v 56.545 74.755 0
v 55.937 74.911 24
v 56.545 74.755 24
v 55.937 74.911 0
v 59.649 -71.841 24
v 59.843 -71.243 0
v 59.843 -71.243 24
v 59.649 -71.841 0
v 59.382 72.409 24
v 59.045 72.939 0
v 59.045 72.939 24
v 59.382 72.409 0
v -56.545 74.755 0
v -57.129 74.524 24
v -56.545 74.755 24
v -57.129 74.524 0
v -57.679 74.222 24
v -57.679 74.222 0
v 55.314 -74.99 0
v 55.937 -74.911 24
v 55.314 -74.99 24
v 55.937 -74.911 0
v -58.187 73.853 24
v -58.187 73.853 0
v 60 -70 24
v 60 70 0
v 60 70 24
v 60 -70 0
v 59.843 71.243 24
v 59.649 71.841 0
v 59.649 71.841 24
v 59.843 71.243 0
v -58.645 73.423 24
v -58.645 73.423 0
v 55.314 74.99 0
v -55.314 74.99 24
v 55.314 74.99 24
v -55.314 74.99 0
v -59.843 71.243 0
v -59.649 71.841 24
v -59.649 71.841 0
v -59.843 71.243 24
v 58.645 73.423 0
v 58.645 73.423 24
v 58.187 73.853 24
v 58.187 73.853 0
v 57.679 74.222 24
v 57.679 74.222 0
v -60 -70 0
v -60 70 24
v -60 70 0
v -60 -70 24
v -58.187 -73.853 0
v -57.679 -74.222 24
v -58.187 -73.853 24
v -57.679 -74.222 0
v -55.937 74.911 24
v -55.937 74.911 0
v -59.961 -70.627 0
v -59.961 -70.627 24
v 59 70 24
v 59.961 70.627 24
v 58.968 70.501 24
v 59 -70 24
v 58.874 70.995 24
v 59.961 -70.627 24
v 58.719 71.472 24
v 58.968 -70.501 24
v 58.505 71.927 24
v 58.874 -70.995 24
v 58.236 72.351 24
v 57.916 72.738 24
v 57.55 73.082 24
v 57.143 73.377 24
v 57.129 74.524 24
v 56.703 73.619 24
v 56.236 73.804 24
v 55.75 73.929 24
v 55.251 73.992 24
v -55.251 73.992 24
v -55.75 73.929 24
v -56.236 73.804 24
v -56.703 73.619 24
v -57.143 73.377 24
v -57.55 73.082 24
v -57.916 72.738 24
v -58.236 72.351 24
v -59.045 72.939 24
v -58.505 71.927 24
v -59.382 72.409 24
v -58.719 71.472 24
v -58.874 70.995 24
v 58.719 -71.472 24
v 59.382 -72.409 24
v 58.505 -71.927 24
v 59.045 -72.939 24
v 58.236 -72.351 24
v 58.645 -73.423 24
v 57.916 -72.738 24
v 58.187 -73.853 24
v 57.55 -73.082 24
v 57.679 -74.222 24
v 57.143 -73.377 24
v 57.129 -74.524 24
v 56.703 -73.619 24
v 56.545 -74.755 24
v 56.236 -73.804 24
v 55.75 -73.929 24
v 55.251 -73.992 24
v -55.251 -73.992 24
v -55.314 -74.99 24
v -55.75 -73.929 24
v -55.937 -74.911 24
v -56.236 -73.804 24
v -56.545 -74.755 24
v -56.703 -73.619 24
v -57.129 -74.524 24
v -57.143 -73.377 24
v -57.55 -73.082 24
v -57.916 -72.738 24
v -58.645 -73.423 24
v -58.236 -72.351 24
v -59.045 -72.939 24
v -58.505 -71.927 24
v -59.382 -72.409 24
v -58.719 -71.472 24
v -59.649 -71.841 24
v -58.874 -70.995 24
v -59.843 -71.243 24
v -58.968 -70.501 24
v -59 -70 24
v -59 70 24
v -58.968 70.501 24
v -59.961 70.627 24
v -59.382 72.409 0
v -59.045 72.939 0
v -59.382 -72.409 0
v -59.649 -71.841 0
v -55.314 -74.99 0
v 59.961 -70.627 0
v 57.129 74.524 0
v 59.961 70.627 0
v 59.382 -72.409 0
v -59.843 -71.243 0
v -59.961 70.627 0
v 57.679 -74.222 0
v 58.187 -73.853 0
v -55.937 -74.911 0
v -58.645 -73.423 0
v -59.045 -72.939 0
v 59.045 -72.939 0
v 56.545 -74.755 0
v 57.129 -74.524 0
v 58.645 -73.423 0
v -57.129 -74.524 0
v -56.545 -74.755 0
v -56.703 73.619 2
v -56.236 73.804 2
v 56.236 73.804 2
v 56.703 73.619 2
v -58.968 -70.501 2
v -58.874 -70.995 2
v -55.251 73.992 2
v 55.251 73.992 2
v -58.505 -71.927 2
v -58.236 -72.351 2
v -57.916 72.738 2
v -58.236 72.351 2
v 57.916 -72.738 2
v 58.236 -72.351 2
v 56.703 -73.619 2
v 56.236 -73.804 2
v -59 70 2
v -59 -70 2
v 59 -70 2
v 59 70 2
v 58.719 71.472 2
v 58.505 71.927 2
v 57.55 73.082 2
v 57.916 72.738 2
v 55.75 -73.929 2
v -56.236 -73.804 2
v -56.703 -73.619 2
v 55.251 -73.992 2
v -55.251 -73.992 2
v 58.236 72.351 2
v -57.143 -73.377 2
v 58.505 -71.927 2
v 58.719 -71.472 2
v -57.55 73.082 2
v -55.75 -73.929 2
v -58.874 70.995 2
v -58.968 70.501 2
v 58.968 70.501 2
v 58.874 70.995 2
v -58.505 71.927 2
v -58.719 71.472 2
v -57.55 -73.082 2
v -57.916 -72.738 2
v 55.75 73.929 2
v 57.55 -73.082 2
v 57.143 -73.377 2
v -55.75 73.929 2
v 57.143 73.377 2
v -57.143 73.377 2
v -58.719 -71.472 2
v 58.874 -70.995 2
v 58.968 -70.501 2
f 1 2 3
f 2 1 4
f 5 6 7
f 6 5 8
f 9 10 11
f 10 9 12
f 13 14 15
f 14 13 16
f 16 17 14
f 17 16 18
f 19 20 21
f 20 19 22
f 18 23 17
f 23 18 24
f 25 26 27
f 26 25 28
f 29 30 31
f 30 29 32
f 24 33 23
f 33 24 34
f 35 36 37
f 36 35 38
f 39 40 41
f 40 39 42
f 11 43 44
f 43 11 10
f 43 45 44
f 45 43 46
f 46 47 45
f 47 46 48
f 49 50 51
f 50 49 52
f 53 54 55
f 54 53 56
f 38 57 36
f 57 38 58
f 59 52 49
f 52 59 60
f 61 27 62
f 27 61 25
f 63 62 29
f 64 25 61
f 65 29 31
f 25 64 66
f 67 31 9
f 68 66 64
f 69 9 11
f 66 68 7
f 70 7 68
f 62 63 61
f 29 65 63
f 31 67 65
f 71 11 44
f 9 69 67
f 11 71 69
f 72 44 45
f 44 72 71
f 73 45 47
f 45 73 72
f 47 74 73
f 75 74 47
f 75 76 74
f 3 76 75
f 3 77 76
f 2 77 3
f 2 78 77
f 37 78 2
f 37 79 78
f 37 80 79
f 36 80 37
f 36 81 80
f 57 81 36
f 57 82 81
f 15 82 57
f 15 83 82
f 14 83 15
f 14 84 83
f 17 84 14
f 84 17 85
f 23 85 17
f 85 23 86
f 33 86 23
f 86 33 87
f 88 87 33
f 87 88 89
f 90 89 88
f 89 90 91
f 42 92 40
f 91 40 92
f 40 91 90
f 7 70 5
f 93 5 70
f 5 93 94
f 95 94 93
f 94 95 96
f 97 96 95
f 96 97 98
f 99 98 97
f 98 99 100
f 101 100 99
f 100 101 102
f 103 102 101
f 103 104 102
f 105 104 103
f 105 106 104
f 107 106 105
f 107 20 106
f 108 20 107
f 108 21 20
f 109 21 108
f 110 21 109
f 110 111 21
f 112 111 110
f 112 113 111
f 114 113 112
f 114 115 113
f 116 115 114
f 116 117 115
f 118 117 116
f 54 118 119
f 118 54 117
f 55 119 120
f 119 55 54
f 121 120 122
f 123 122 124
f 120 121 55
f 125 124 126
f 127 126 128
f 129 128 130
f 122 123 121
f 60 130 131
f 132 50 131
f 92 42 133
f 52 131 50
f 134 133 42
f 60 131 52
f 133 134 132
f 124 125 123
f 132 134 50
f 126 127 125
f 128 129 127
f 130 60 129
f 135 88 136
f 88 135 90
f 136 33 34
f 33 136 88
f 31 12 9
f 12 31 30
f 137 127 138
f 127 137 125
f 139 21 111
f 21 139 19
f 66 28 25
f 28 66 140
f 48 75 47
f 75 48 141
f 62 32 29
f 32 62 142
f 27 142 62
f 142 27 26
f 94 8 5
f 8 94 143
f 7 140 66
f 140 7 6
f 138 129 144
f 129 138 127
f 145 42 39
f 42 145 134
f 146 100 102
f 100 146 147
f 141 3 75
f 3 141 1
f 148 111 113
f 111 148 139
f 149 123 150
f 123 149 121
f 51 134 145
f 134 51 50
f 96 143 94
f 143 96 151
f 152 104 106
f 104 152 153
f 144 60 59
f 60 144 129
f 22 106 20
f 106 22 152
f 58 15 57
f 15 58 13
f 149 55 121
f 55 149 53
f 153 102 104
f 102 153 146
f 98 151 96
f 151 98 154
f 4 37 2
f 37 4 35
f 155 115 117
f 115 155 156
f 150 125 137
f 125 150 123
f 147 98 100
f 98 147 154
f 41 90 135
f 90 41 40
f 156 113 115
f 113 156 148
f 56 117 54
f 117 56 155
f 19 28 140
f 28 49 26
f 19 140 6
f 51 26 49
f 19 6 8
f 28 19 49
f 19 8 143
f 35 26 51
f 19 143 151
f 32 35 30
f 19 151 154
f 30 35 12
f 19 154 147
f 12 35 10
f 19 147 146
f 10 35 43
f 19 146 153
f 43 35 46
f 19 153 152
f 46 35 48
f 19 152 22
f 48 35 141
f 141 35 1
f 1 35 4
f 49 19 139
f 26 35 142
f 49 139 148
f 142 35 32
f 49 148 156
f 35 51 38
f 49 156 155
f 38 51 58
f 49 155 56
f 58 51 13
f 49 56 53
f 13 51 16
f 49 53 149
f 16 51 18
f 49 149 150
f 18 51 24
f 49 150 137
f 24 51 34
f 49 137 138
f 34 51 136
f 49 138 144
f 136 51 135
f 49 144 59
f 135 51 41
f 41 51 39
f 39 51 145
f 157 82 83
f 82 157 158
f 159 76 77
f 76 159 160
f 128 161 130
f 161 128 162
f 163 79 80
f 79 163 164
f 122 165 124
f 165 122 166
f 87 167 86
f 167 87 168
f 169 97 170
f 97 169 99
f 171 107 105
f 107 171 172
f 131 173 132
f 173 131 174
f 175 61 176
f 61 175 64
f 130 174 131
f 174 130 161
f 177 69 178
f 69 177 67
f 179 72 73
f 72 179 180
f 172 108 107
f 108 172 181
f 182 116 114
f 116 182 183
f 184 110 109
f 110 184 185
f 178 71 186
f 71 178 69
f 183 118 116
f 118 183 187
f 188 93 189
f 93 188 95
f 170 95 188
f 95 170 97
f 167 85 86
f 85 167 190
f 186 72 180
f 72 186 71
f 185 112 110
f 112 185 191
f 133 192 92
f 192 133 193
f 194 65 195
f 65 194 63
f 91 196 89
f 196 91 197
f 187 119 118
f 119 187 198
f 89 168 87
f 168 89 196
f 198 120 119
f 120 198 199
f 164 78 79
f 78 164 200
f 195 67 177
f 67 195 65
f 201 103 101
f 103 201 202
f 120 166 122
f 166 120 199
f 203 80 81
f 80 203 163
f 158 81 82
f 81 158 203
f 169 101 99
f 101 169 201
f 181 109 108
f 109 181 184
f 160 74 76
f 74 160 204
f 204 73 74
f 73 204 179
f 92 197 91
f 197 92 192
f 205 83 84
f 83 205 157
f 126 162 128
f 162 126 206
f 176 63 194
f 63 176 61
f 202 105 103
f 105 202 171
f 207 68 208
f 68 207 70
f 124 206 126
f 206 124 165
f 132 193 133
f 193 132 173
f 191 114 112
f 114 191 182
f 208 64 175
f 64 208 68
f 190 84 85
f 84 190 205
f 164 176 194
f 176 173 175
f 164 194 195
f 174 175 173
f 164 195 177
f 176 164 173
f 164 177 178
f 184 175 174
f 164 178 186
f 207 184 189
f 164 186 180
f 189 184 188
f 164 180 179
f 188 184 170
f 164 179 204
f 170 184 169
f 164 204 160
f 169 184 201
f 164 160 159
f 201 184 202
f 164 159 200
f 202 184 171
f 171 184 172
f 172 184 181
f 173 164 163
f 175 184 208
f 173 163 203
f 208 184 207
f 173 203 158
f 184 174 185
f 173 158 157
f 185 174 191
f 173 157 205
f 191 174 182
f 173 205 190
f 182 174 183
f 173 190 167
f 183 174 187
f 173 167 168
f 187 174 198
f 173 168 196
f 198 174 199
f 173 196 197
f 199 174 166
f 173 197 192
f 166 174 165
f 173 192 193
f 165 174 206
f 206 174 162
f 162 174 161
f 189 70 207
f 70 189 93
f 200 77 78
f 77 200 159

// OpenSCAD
$fn = 50;


difference() {
	union() {
		hull() {
			translate(v = [-55.0000000000, 70.0000000000, 0]) {
				cylinder(h = 24, r = 5);
			}
			translate(v = [55.0000000000, 70.0000000000, 0]) {
				cylinder(h = 24, r = 5);
			}
			translate(v = [-55.0000000000, -70.0000000000, 0]) {
				cylinder(h = 24, r = 5);
			}
			translate(v = [55.0000000000, -70.0000000000, 0]) {
				cylinder(h = 24, r = 5);
			}
		}
	}
	union() {
		translate(v = [0, 0, 2]) {
			hull() {
				translate(v = [-55.0000000000, 70.0000000000, 0]) {
					cylinder(h = 22, r = 4);
				}
				translate(v = [55.0000000000, 70.0000000000, 0]) {
					cylinder(h = 22, r = 4);
				}
				translate(v = [-55.0000000000, -70.0000000000, 0]) {
					cylinder(h = 22, r = 4);
				}
				translate(v = [55.0000000000, -70.0000000000, 0]) {
					cylinder(h = 22, r = 4);
				}
			}
		}
	}
}
